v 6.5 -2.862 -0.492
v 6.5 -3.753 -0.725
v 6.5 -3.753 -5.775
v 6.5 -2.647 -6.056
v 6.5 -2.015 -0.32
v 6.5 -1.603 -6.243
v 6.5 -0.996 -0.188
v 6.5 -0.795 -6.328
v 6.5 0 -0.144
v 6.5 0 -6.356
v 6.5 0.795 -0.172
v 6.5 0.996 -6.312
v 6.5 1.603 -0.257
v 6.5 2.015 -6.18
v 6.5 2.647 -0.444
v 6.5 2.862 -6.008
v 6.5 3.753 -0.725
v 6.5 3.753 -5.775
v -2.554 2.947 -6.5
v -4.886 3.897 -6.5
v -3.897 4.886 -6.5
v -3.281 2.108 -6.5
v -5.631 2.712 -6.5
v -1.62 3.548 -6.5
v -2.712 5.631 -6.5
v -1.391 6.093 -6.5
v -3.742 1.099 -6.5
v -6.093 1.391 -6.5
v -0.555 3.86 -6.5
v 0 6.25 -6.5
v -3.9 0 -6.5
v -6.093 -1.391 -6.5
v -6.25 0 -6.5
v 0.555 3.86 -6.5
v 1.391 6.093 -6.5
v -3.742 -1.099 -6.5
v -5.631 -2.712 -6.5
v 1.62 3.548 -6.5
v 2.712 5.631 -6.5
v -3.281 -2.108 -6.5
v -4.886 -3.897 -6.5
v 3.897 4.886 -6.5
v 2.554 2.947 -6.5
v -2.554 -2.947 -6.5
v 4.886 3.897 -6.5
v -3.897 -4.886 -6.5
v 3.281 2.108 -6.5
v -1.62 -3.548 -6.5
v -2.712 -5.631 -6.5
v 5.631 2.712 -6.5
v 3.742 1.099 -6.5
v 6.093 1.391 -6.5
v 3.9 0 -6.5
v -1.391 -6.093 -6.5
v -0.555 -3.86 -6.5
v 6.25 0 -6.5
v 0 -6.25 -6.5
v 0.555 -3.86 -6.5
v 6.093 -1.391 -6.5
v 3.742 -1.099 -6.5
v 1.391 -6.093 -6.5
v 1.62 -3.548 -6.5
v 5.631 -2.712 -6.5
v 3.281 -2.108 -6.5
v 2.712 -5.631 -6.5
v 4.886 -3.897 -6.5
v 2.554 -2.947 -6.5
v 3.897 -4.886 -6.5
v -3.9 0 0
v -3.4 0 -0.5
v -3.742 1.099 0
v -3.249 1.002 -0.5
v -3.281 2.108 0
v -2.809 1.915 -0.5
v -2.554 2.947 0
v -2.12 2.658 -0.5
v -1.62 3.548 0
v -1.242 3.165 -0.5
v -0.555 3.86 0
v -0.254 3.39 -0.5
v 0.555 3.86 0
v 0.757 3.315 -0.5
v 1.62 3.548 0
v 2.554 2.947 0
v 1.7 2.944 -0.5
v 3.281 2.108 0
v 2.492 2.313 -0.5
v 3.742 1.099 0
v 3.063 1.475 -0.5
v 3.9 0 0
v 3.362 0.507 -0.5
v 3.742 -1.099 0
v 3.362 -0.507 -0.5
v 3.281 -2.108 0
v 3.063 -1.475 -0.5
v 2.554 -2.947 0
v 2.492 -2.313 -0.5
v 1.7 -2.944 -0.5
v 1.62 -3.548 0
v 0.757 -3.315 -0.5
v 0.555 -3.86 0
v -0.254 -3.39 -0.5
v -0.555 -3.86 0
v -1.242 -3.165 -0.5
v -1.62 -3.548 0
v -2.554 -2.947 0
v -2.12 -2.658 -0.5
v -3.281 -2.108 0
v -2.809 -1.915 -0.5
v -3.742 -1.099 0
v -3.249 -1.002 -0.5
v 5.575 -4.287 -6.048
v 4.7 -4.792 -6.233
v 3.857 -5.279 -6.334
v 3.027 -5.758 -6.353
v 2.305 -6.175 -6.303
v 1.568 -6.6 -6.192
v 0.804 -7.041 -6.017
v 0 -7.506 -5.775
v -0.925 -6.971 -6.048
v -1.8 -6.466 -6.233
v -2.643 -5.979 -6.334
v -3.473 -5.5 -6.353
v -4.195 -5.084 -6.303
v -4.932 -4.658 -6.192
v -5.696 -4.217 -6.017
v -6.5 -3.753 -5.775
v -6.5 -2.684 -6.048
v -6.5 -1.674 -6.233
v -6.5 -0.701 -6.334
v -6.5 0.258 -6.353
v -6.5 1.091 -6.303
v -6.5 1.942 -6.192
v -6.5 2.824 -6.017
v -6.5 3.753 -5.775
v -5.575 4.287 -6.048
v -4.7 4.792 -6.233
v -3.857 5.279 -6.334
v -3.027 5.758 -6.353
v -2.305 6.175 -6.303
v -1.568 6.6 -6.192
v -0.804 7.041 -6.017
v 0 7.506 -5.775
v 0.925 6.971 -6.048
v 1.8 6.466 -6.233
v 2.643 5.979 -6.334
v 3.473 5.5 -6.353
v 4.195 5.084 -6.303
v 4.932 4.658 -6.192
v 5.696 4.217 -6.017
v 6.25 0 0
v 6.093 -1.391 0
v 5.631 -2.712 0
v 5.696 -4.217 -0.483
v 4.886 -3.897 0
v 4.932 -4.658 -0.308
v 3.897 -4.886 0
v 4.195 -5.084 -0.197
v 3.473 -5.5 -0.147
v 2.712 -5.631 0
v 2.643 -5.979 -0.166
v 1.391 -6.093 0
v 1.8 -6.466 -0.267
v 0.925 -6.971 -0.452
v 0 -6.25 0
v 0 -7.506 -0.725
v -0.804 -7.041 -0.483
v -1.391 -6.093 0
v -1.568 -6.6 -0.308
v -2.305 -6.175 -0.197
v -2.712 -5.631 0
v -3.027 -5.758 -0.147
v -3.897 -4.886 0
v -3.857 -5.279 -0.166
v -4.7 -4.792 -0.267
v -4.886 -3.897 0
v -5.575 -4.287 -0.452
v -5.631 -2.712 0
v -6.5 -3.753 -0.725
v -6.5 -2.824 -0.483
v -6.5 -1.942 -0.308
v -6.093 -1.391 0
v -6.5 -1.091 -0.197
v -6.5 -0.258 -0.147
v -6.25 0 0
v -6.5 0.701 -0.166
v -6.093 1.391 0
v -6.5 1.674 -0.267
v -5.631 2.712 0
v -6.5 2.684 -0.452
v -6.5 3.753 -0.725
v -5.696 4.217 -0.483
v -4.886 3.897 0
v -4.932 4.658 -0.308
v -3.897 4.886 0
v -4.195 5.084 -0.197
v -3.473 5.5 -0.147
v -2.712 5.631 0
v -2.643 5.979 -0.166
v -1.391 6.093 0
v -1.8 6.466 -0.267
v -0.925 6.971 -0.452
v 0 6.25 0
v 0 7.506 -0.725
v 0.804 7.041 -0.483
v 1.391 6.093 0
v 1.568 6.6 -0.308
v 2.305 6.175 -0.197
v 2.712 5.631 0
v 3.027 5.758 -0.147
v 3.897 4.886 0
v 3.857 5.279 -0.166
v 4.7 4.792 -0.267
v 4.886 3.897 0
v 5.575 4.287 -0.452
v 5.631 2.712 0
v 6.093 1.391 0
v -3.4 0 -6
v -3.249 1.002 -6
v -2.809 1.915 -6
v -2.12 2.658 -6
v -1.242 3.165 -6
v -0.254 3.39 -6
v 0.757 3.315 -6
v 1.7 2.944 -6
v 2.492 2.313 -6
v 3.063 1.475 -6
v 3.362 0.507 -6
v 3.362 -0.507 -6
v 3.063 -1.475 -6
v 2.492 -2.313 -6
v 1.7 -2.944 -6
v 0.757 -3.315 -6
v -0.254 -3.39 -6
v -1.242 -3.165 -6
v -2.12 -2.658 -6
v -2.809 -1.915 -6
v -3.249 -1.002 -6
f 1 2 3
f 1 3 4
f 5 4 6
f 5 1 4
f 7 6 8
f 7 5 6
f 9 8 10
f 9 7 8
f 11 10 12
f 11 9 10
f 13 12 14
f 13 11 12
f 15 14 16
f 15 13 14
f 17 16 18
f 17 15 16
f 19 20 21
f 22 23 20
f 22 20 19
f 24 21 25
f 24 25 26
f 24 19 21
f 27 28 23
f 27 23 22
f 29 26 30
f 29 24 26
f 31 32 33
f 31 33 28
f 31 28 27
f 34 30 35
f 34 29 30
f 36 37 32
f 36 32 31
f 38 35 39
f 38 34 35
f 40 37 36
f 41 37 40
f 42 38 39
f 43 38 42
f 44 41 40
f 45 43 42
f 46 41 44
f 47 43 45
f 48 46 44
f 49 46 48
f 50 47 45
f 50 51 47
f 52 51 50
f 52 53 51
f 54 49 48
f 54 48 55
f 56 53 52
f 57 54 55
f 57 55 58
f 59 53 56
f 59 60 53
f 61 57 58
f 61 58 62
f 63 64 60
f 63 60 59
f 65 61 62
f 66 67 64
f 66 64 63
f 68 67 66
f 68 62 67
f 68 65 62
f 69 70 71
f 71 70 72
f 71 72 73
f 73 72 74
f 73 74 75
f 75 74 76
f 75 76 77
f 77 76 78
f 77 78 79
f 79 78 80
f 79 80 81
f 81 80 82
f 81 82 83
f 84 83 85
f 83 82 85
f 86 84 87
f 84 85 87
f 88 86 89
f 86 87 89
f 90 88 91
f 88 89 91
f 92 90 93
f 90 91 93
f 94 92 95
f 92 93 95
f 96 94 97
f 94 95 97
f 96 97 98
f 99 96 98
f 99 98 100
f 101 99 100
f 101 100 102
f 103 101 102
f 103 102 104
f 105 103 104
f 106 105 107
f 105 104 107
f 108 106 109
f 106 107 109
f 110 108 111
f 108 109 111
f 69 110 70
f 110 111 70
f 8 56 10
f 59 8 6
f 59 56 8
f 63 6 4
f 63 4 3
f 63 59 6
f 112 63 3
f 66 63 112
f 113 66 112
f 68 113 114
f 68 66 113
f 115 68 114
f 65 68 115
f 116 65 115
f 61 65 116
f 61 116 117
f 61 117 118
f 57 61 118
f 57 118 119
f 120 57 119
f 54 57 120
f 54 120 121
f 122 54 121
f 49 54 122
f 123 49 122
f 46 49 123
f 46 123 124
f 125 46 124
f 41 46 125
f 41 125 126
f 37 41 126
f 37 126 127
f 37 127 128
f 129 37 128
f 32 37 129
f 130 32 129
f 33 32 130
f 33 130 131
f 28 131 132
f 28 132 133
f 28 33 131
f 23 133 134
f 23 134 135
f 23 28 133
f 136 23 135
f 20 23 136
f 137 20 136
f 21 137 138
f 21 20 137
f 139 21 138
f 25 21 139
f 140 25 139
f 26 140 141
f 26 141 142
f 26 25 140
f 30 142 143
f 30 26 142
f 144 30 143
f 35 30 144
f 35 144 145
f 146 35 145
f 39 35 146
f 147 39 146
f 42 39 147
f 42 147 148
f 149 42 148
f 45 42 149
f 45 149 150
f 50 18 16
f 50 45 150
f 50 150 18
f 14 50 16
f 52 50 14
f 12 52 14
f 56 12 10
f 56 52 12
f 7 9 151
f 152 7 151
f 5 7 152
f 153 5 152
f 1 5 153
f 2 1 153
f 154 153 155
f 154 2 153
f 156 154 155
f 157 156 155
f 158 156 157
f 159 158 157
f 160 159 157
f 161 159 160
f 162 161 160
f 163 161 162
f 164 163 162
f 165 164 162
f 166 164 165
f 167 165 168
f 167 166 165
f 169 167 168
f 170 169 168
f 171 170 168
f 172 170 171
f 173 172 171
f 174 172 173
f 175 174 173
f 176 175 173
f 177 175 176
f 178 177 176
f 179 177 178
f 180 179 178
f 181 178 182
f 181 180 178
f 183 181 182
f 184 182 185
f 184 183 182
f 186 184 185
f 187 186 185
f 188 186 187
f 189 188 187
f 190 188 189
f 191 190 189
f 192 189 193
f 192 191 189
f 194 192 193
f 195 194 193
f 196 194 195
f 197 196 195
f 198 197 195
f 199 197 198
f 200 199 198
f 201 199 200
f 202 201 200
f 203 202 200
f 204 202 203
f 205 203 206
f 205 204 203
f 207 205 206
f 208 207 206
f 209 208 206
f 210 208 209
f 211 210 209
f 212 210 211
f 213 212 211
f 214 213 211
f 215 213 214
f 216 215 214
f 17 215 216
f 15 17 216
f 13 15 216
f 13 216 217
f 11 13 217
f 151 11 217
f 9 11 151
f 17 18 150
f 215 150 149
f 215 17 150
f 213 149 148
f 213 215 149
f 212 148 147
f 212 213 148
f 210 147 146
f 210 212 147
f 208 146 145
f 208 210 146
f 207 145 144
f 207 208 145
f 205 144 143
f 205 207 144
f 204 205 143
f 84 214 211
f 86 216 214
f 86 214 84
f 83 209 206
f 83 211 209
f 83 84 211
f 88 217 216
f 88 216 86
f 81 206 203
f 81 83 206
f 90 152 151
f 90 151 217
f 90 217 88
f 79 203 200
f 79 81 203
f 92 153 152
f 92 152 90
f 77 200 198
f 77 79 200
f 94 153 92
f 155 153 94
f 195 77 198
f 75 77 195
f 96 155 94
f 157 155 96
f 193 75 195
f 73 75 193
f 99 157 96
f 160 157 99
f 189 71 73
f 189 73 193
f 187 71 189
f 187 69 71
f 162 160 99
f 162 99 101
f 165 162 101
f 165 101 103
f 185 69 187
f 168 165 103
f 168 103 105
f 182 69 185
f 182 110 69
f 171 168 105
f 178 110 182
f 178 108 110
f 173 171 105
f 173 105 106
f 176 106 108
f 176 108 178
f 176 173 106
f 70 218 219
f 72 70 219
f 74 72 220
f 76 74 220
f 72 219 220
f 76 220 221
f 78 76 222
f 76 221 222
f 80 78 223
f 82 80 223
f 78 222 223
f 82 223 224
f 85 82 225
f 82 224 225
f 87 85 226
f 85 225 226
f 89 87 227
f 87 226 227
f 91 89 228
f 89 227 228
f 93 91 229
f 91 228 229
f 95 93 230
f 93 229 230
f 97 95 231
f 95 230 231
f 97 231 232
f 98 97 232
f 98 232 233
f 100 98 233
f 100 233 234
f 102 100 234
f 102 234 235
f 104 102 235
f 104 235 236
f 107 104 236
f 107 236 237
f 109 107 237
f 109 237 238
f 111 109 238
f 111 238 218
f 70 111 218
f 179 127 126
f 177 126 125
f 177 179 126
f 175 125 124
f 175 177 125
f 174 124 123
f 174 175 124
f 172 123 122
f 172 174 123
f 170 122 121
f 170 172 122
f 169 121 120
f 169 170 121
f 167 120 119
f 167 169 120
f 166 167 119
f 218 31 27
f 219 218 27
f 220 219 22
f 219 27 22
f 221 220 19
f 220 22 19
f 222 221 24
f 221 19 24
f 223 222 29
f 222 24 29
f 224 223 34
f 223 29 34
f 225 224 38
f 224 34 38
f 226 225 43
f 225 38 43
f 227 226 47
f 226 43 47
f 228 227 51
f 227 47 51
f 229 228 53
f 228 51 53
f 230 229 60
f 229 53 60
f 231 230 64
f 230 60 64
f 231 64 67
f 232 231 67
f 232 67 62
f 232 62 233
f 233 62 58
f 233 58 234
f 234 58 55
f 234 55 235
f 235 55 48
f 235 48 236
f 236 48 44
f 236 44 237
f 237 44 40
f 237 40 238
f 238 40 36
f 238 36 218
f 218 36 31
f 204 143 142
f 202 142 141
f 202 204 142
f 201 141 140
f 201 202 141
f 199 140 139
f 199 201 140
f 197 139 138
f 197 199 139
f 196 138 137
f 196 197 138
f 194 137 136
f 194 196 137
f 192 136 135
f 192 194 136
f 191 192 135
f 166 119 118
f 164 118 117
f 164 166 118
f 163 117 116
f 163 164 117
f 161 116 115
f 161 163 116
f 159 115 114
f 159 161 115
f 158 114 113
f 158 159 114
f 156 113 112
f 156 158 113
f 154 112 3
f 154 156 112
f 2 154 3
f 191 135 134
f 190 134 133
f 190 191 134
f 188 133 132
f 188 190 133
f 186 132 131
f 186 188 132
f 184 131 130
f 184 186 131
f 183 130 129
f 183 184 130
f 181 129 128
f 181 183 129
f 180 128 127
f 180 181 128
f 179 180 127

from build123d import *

# Parameters (mm, degrees)
SKETCH2_R              = 8
CUT_EXTRUDE1_DEPTH     = 14.047988351
M8X1_25_TAPPED_HOLE1_D = 6.8
CHAMFER1_SIZE          = 0.5


with BuildPart() as part:
    # Sketch1 → Revolve1 (revolve)
    with BuildSketch(Plane(origin=(0, 0, 0), x_dir=(0, 0, -1), z_dir=(1, 0, 0)), mode=Mode.PRIVATE) as revolve1_sk:
        Polygon((0, 6.25), (1.010362971, 8), (5.489637029, 8), (6.5, 6.25), (6.5, 0), (0, 0), align=None)
    revolve(revolve1_sk.sketch.rotate(Axis((0, 0, 0), (0, 0, -1)), 90), axis=Axis((0, 0, 0), (0, 0, -1)))

    # Sketch2 → Cut-Extrude1 (cut, through all)
    with BuildSketch(Plane.XY):
        Circle(SKETCH2_R)
        Polygon((0, 7.505553499), (-6.5, 3.75277675), (-6.5, -3.75277675), (0, -7.505553499), (6.5, -3.75277675), (6.5, 3.75277675), align=None, mode=Mode.SUBTRACT)
    extrude(amount=-CUT_EXTRUDE1_DEPTH, mode=Mode.SUBTRACT)

    # M8x1.25 Tapped Hole1 (through all)
    with Locations(Plane.XY):
        with Locations((0, 0)):
            Hole(M8X1_25_TAPPED_HOLE1_D / 2)

    # Chamfer1
    chamfer1_edges = [part.edges().sort_by_distance(p)[0] for p in [
        (3.4, 0, 0),
        (3.4, 0, -6.5),
    ]]
    chamfer(chamfer1_edges, length=CHAMFER1_SIZE)


solid = part.part
